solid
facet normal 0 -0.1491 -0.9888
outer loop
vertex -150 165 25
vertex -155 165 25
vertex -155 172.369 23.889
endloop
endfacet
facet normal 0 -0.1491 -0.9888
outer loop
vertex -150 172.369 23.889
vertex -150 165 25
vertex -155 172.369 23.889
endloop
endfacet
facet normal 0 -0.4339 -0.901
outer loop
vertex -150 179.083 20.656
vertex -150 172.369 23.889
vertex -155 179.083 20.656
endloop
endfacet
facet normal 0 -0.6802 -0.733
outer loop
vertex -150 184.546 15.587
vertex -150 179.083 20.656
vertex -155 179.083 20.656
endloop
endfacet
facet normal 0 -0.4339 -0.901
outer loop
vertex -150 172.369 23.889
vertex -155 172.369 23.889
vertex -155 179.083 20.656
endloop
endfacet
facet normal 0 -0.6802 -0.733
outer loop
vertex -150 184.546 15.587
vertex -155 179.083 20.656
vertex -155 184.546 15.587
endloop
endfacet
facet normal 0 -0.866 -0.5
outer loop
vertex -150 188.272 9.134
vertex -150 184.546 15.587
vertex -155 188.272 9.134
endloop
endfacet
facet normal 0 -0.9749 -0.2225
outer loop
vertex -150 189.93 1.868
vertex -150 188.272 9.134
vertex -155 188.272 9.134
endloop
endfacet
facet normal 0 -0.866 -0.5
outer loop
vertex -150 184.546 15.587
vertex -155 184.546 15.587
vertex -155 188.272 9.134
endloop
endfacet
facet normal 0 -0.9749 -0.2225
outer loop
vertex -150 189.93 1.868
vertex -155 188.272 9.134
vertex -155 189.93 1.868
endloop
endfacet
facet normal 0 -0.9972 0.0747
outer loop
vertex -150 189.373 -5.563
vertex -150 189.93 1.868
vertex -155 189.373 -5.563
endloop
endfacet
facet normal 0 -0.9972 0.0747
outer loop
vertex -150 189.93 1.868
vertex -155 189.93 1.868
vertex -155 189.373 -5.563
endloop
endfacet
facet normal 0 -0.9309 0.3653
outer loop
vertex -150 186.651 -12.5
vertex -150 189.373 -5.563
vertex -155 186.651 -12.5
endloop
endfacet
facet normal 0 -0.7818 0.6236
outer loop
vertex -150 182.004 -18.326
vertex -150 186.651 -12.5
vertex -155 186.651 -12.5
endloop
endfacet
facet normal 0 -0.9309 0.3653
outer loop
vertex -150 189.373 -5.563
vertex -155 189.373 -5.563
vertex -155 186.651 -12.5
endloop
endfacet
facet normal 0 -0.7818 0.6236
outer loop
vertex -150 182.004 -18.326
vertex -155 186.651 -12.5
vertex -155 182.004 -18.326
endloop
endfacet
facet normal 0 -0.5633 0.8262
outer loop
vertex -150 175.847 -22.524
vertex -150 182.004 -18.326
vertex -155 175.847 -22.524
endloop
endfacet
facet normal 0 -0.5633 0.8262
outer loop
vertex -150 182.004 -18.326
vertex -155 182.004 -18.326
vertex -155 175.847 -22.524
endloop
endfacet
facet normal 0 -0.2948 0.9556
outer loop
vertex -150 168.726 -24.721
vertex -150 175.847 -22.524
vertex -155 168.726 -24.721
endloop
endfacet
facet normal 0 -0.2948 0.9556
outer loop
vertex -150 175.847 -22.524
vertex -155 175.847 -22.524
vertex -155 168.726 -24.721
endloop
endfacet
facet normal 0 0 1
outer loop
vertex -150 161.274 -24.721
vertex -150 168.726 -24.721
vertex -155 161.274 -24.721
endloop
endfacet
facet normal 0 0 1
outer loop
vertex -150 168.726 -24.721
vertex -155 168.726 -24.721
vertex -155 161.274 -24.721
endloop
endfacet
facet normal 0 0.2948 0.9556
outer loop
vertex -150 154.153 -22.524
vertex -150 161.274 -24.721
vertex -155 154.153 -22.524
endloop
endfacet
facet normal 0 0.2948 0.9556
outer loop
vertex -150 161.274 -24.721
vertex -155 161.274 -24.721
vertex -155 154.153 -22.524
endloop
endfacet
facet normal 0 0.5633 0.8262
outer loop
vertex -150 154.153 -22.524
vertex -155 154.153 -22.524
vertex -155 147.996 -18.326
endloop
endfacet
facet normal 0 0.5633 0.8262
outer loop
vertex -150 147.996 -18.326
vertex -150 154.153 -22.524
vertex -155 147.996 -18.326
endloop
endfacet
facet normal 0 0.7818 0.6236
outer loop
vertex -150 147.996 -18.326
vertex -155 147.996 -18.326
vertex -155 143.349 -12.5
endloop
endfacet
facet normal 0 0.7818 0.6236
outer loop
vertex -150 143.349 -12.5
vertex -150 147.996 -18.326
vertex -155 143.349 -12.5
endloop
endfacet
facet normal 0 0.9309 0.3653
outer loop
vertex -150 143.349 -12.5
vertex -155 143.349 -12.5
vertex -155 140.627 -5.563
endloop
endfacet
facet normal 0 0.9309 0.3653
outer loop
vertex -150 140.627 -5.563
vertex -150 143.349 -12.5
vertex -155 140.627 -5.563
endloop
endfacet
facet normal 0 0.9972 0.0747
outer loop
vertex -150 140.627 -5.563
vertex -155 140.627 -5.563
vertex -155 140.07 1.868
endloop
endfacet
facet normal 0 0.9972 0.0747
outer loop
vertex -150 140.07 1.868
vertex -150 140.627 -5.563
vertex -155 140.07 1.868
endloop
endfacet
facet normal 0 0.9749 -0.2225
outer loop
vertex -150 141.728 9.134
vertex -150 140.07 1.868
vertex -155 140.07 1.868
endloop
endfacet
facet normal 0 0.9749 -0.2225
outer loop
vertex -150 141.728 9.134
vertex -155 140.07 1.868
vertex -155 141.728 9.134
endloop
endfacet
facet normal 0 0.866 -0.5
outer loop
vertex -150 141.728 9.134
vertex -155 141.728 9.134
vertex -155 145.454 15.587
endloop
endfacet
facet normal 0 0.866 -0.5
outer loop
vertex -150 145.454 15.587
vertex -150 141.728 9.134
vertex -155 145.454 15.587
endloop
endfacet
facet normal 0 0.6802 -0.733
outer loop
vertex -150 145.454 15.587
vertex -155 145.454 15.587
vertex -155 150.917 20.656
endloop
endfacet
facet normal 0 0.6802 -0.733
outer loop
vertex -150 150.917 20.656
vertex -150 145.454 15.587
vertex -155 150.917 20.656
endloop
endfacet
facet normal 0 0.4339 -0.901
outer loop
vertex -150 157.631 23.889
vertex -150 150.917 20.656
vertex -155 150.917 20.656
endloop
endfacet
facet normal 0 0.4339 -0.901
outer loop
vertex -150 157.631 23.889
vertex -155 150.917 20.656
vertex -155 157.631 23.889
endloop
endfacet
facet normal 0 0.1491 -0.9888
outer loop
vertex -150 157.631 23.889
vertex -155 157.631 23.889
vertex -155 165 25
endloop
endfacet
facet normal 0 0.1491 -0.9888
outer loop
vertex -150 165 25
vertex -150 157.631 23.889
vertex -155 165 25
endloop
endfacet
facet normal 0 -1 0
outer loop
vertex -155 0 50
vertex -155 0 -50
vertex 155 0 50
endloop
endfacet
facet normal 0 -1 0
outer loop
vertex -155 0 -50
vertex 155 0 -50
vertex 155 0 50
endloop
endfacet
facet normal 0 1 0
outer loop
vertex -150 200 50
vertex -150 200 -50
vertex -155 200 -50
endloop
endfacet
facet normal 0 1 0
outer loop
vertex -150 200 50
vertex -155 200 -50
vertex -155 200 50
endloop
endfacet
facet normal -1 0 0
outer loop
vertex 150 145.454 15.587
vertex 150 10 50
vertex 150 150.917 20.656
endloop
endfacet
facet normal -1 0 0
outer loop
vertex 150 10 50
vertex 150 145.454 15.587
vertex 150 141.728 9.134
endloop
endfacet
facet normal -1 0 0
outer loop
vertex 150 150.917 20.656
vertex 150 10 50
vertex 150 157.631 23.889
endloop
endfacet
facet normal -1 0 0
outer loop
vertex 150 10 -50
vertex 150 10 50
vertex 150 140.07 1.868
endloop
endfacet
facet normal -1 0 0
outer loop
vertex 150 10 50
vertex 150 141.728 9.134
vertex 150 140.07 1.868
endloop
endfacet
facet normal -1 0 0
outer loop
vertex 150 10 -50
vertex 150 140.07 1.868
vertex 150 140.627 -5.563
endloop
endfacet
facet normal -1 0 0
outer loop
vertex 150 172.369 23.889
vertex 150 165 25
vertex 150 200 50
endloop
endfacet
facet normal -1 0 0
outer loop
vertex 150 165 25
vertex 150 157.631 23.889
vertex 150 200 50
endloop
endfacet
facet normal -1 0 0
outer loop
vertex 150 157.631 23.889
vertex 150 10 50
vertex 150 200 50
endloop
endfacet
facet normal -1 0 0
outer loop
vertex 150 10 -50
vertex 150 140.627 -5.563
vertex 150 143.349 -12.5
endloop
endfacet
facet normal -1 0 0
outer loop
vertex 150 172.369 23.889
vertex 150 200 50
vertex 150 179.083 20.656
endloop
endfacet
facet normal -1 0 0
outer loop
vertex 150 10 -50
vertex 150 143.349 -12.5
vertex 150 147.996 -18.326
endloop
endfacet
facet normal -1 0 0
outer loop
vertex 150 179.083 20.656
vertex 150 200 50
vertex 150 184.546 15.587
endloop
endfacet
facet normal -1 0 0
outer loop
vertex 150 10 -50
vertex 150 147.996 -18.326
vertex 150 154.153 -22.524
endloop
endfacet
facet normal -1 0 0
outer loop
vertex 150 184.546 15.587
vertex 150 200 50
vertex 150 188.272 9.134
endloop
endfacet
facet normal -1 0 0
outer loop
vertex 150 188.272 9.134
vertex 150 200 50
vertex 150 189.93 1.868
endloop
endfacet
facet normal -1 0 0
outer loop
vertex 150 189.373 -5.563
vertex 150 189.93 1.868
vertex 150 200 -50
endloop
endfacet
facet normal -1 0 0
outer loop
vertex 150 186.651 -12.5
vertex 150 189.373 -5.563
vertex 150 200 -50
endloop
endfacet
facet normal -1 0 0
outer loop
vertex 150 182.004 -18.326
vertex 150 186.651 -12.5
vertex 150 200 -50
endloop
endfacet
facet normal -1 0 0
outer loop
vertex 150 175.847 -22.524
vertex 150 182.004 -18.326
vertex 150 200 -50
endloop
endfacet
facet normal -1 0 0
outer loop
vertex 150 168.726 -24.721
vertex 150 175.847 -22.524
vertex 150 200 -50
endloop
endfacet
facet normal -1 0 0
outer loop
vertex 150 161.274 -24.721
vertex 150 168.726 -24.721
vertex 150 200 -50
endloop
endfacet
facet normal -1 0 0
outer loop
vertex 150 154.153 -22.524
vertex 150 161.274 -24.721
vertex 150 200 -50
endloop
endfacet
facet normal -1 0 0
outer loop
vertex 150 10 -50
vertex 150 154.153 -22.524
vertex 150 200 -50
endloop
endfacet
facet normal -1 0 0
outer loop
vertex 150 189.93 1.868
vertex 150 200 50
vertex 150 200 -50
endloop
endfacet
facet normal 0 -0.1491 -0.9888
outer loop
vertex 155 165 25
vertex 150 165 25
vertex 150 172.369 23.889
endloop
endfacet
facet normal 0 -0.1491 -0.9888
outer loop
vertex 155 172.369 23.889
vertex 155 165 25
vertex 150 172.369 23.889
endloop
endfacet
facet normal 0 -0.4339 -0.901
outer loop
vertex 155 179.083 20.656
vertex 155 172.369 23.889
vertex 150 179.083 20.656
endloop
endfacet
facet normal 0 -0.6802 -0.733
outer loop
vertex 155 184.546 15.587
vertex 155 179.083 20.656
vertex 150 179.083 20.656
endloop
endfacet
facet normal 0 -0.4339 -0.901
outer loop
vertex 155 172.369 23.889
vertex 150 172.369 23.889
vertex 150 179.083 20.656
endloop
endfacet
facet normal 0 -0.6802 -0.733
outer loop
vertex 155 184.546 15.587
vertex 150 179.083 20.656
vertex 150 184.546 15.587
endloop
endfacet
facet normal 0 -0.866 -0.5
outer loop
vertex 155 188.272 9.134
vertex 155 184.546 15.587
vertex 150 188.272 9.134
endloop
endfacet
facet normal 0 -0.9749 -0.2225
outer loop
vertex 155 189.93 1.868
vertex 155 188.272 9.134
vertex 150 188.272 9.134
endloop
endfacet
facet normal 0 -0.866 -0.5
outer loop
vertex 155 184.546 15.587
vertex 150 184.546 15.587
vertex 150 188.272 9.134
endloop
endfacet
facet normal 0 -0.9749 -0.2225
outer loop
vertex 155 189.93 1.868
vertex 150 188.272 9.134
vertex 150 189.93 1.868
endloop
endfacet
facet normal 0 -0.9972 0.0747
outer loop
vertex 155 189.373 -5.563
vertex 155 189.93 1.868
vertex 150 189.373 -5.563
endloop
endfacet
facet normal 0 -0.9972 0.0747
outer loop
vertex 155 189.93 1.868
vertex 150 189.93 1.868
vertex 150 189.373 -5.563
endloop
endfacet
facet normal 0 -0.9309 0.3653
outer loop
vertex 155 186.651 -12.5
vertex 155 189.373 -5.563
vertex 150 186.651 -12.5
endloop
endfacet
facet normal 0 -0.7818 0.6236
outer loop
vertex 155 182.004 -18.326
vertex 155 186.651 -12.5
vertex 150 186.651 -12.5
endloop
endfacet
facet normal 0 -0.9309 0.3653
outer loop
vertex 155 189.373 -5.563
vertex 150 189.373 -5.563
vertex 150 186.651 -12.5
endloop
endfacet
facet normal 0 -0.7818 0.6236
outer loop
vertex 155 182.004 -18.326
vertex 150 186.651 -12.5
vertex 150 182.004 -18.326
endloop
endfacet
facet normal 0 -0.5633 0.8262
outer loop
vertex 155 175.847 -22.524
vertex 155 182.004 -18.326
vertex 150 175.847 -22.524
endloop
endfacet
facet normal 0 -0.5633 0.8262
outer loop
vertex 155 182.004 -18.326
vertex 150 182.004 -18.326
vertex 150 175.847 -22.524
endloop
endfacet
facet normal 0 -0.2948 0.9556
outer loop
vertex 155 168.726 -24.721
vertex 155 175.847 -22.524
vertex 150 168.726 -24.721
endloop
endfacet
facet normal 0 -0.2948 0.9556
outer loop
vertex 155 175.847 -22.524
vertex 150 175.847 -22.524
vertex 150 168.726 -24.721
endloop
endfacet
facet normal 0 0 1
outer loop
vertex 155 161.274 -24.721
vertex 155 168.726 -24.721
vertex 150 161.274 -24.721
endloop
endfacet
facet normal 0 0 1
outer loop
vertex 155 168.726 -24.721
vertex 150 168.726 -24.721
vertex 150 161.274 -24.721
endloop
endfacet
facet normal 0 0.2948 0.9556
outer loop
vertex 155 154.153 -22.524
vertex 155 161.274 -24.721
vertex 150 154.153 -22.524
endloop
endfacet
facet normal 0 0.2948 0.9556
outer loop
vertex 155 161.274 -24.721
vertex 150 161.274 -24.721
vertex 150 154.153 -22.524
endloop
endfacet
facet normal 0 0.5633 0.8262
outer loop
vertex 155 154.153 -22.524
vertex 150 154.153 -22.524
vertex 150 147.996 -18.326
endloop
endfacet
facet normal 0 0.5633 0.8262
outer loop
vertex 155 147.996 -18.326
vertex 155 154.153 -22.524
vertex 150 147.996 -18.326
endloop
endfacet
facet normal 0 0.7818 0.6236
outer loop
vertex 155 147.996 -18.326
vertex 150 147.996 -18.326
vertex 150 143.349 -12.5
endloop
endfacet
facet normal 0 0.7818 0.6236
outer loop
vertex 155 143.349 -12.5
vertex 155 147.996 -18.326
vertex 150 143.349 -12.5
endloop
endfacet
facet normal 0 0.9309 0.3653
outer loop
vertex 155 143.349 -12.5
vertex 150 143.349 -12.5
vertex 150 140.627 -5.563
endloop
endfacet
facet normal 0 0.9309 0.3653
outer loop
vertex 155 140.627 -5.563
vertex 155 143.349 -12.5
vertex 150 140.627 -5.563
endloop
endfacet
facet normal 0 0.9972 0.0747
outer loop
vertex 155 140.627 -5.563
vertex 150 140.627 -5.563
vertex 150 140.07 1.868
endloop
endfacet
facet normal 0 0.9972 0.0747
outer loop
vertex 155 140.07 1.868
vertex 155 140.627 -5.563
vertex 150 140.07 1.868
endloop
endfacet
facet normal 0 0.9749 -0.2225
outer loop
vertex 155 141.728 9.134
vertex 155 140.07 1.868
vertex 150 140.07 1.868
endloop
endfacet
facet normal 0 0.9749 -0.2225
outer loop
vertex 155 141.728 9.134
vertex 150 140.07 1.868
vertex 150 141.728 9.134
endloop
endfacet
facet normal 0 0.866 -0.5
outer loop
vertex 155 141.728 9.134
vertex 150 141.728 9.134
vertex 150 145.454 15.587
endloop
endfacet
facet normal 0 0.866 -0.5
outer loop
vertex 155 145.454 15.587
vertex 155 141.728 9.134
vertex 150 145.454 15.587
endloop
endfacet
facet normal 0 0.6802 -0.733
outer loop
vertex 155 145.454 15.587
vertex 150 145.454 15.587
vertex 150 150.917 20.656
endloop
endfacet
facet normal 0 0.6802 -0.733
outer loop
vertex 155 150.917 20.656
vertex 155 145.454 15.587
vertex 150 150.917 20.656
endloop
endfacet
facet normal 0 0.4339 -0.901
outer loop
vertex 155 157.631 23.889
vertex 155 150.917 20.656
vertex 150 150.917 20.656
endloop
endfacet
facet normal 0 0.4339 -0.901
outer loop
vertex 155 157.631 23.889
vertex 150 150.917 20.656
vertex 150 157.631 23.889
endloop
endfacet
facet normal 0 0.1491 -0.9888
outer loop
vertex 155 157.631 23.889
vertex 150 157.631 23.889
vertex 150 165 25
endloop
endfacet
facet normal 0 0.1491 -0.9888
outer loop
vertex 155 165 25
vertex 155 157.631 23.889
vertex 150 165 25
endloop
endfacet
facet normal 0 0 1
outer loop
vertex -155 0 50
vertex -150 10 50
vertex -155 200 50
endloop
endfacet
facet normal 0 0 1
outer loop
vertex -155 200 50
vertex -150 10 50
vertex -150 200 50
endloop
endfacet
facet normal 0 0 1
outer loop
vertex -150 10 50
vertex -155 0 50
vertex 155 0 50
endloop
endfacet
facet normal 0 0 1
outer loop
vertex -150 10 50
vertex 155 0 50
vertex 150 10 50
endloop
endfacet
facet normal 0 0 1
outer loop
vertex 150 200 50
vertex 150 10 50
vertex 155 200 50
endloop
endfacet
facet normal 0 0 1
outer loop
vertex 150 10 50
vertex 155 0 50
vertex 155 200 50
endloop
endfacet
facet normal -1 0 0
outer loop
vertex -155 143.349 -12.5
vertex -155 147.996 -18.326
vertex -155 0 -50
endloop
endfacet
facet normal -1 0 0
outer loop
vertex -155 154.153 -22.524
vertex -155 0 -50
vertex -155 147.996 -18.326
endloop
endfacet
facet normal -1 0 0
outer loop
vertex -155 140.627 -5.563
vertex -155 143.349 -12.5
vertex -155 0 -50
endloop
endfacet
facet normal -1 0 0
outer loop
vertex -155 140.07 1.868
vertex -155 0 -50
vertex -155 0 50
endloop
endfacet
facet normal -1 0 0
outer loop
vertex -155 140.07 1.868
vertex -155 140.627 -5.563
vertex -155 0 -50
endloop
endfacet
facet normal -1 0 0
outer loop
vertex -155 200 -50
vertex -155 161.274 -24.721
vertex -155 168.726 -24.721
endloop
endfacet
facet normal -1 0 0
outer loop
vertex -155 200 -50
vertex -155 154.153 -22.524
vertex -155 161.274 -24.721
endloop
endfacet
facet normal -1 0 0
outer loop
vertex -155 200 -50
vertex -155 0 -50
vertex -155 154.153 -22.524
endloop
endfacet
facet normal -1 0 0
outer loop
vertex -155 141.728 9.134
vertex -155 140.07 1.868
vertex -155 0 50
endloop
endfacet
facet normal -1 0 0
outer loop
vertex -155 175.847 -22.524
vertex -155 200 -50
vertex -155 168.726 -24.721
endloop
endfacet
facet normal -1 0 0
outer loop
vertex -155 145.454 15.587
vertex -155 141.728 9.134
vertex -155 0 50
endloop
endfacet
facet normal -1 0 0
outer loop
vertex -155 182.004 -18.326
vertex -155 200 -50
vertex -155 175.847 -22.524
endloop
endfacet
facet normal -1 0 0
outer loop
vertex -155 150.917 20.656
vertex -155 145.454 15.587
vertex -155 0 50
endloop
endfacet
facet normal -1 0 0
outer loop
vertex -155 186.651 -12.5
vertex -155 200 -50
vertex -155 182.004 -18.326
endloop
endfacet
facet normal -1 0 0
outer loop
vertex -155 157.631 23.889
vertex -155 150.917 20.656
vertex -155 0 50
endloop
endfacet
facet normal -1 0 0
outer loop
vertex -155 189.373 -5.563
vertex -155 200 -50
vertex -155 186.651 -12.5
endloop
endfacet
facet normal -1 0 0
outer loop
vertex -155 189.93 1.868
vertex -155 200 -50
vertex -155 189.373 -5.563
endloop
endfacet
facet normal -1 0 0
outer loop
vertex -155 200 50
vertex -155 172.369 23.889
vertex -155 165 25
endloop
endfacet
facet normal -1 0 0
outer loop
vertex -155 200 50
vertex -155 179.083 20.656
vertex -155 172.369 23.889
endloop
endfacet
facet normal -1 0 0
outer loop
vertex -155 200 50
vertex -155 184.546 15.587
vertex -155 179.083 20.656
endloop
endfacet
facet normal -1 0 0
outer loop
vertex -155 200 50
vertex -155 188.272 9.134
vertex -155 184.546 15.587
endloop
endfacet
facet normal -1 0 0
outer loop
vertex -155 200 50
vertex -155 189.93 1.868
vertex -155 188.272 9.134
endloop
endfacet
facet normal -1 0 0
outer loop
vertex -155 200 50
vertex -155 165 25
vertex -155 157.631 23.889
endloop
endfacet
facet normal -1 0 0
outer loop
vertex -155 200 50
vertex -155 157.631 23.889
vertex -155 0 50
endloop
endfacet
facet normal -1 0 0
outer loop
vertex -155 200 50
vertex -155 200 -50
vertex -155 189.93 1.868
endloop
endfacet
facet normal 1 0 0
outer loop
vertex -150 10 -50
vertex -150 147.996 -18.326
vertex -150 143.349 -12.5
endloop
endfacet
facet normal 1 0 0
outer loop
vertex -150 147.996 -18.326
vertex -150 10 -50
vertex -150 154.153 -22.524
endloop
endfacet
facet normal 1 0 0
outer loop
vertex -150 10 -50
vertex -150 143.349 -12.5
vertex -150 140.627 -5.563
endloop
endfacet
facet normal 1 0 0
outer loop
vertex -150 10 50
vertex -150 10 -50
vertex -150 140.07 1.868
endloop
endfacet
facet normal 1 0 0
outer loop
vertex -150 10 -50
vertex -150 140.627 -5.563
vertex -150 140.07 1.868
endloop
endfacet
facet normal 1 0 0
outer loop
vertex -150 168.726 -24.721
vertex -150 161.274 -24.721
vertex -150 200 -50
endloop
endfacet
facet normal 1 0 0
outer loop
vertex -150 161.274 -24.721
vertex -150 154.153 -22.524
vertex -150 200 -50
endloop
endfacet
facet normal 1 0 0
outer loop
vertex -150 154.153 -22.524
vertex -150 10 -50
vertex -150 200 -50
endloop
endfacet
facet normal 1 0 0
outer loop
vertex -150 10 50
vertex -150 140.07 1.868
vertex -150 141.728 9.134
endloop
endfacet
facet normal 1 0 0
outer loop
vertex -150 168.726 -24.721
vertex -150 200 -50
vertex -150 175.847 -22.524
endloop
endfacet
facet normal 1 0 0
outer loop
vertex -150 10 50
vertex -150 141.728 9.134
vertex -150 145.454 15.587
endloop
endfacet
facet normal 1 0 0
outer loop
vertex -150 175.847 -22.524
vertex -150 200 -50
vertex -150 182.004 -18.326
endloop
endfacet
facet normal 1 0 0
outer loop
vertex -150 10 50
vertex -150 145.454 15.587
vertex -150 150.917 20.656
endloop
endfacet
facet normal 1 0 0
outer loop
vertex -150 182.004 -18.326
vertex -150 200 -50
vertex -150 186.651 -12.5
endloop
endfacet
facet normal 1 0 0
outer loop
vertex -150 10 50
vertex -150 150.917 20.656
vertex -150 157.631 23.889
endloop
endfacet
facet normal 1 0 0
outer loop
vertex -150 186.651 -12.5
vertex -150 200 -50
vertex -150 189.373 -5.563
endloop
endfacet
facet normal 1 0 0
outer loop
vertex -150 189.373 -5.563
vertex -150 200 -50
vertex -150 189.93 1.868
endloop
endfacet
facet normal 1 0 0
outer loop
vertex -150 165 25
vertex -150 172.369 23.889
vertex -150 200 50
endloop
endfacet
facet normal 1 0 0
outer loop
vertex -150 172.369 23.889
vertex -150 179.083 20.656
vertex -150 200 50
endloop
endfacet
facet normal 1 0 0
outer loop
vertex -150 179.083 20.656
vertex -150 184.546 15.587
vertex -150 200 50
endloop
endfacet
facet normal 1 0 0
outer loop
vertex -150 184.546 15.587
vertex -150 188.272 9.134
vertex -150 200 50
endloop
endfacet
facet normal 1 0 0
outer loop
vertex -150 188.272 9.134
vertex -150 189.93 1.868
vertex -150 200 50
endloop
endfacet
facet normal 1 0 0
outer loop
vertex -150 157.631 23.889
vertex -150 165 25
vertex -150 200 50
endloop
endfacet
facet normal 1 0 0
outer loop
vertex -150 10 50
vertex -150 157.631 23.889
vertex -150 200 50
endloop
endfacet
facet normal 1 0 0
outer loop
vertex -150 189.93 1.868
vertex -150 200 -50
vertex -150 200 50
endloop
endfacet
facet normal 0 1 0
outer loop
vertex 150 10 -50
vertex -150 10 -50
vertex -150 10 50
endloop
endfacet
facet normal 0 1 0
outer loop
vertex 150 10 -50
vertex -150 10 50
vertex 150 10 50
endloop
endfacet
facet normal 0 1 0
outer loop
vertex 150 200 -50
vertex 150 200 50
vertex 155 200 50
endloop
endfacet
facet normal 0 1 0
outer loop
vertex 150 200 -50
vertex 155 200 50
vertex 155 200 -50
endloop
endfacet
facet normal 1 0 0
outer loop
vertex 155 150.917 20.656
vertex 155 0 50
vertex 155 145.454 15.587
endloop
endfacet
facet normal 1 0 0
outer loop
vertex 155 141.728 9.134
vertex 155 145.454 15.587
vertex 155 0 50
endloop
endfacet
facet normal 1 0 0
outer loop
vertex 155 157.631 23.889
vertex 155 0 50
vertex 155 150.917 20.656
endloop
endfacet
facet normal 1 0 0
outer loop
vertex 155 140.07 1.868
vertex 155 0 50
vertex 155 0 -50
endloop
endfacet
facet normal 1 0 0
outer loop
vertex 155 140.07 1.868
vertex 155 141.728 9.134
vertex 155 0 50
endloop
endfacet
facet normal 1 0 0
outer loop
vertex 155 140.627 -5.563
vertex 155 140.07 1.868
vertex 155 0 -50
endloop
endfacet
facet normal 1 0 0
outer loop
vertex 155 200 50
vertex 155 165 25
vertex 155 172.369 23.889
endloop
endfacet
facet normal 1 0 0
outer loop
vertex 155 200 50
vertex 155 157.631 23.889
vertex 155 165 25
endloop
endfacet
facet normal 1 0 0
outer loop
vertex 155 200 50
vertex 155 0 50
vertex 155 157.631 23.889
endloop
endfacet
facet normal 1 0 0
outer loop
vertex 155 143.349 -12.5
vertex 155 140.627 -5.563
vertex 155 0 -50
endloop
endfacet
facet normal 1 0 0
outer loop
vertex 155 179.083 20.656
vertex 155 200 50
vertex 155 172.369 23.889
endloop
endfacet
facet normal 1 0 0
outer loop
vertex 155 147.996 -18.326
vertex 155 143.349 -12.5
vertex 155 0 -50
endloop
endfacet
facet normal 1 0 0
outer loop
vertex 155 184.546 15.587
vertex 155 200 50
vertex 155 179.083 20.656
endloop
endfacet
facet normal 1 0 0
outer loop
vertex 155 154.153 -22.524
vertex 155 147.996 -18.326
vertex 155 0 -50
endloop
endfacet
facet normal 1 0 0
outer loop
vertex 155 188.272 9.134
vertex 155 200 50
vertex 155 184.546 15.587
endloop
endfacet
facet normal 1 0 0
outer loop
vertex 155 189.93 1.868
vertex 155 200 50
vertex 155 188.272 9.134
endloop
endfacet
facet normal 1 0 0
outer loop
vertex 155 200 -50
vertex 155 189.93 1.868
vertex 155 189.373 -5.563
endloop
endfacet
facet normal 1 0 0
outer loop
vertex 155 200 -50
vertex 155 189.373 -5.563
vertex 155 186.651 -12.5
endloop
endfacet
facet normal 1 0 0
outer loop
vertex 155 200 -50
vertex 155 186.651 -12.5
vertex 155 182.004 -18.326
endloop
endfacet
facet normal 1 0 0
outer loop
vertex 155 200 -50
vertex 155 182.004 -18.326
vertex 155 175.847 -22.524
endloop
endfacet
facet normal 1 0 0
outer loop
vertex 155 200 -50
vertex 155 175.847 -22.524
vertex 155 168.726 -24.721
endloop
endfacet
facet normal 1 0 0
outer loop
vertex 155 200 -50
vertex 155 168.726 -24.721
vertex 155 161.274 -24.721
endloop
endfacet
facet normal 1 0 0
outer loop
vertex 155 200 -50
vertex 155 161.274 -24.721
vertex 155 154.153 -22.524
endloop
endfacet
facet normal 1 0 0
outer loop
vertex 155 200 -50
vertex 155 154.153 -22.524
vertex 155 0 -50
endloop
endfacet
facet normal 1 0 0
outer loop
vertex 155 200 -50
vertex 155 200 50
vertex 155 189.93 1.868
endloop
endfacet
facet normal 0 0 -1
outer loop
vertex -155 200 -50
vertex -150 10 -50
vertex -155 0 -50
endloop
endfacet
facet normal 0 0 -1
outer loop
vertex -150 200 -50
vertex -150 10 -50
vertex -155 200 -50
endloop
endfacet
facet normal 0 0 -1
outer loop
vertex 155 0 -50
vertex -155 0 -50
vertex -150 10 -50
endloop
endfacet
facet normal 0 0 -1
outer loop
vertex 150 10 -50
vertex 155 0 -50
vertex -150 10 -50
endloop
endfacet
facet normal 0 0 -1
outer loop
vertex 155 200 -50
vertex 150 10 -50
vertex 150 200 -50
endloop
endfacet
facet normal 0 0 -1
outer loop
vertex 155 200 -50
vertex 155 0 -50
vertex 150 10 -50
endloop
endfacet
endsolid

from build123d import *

# Parameters (mm, degrees)
SKETCH1_W           = 300
SKETCH1_H           = 100
BOSS_EXTRUDE1_DEPTH = 10
SKETCH2_W           = 100
SKETCH2_H           = 200
BOSS_EXTRUDE2_DEPTH = 5
SKETCH3_W           = 100
SKETCH3_H           = 200
BOSS_EXTRUDE3_DEPTH = 5
CUT_EXTRUDE1_REACH  = 374.29
SKETCH4_R           = 25


with BuildPart() as part:
    # Sketch1 → Boss-Extrude1 (new body)
    with BuildSketch(Plane(origin=(0, 0, 0), x_dir=(1, 0, 0), z_dir=(0, 1, 0))):
        Rectangle(SKETCH1_W, SKETCH1_H)
    extrude(amount=BOSS_EXTRUDE1_DEPTH)

    # Sketch2 → Boss-Extrude2 (add)
    with BuildSketch(Plane(origin=(150, 0, 0), x_dir=(0, 0, -1), z_dir=(1, 0, 0))):
        with Locations((0, 100)):
            Rectangle(SKETCH2_W, SKETCH2_H)
    extrude(amount=BOSS_EXTRUDE2_DEPTH)

    # Sketch3 → Boss-Extrude3 (add)
    with BuildSketch(Plane.ZY.offset(150)):
        with Locations((0, 100)):
            Rectangle(SKETCH3_W, SKETCH3_H)
    extrude(amount=BOSS_EXTRUDE3_DEPTH)

    # Cut-Extrude1: up to this face of the body (flat: up to its plane)
    cut_extrude1_end = Plane(part.part.faces().sort_by_distance((155, 100, 0))[0])
    # Sketch4 → Cut-Extrude1 (cut, up to the picked face)
    with BuildSketch(Plane.ZY.offset(155), mode=Mode.PRIVATE) as cut_extrude1_sk1:
        with Locations((0, 165)):
            Circle(SKETCH4_R)
    cut_extrude1_tool1 = split(extrude(cut_extrude1_sk1.sketch, amount=-CUT_EXTRUDE1_REACH, mode=Mode.PRIVATE), bisect_by=cut_extrude1_end, keep=Keep.BOTH, mode=Mode.PRIVATE)
    add(cut_extrude1_tool1.solids().sort_by(Axis((-155, 165, 0), (1, 0, 0)))[0], mode=Mode.SUBTRACT)


solid = part.part
